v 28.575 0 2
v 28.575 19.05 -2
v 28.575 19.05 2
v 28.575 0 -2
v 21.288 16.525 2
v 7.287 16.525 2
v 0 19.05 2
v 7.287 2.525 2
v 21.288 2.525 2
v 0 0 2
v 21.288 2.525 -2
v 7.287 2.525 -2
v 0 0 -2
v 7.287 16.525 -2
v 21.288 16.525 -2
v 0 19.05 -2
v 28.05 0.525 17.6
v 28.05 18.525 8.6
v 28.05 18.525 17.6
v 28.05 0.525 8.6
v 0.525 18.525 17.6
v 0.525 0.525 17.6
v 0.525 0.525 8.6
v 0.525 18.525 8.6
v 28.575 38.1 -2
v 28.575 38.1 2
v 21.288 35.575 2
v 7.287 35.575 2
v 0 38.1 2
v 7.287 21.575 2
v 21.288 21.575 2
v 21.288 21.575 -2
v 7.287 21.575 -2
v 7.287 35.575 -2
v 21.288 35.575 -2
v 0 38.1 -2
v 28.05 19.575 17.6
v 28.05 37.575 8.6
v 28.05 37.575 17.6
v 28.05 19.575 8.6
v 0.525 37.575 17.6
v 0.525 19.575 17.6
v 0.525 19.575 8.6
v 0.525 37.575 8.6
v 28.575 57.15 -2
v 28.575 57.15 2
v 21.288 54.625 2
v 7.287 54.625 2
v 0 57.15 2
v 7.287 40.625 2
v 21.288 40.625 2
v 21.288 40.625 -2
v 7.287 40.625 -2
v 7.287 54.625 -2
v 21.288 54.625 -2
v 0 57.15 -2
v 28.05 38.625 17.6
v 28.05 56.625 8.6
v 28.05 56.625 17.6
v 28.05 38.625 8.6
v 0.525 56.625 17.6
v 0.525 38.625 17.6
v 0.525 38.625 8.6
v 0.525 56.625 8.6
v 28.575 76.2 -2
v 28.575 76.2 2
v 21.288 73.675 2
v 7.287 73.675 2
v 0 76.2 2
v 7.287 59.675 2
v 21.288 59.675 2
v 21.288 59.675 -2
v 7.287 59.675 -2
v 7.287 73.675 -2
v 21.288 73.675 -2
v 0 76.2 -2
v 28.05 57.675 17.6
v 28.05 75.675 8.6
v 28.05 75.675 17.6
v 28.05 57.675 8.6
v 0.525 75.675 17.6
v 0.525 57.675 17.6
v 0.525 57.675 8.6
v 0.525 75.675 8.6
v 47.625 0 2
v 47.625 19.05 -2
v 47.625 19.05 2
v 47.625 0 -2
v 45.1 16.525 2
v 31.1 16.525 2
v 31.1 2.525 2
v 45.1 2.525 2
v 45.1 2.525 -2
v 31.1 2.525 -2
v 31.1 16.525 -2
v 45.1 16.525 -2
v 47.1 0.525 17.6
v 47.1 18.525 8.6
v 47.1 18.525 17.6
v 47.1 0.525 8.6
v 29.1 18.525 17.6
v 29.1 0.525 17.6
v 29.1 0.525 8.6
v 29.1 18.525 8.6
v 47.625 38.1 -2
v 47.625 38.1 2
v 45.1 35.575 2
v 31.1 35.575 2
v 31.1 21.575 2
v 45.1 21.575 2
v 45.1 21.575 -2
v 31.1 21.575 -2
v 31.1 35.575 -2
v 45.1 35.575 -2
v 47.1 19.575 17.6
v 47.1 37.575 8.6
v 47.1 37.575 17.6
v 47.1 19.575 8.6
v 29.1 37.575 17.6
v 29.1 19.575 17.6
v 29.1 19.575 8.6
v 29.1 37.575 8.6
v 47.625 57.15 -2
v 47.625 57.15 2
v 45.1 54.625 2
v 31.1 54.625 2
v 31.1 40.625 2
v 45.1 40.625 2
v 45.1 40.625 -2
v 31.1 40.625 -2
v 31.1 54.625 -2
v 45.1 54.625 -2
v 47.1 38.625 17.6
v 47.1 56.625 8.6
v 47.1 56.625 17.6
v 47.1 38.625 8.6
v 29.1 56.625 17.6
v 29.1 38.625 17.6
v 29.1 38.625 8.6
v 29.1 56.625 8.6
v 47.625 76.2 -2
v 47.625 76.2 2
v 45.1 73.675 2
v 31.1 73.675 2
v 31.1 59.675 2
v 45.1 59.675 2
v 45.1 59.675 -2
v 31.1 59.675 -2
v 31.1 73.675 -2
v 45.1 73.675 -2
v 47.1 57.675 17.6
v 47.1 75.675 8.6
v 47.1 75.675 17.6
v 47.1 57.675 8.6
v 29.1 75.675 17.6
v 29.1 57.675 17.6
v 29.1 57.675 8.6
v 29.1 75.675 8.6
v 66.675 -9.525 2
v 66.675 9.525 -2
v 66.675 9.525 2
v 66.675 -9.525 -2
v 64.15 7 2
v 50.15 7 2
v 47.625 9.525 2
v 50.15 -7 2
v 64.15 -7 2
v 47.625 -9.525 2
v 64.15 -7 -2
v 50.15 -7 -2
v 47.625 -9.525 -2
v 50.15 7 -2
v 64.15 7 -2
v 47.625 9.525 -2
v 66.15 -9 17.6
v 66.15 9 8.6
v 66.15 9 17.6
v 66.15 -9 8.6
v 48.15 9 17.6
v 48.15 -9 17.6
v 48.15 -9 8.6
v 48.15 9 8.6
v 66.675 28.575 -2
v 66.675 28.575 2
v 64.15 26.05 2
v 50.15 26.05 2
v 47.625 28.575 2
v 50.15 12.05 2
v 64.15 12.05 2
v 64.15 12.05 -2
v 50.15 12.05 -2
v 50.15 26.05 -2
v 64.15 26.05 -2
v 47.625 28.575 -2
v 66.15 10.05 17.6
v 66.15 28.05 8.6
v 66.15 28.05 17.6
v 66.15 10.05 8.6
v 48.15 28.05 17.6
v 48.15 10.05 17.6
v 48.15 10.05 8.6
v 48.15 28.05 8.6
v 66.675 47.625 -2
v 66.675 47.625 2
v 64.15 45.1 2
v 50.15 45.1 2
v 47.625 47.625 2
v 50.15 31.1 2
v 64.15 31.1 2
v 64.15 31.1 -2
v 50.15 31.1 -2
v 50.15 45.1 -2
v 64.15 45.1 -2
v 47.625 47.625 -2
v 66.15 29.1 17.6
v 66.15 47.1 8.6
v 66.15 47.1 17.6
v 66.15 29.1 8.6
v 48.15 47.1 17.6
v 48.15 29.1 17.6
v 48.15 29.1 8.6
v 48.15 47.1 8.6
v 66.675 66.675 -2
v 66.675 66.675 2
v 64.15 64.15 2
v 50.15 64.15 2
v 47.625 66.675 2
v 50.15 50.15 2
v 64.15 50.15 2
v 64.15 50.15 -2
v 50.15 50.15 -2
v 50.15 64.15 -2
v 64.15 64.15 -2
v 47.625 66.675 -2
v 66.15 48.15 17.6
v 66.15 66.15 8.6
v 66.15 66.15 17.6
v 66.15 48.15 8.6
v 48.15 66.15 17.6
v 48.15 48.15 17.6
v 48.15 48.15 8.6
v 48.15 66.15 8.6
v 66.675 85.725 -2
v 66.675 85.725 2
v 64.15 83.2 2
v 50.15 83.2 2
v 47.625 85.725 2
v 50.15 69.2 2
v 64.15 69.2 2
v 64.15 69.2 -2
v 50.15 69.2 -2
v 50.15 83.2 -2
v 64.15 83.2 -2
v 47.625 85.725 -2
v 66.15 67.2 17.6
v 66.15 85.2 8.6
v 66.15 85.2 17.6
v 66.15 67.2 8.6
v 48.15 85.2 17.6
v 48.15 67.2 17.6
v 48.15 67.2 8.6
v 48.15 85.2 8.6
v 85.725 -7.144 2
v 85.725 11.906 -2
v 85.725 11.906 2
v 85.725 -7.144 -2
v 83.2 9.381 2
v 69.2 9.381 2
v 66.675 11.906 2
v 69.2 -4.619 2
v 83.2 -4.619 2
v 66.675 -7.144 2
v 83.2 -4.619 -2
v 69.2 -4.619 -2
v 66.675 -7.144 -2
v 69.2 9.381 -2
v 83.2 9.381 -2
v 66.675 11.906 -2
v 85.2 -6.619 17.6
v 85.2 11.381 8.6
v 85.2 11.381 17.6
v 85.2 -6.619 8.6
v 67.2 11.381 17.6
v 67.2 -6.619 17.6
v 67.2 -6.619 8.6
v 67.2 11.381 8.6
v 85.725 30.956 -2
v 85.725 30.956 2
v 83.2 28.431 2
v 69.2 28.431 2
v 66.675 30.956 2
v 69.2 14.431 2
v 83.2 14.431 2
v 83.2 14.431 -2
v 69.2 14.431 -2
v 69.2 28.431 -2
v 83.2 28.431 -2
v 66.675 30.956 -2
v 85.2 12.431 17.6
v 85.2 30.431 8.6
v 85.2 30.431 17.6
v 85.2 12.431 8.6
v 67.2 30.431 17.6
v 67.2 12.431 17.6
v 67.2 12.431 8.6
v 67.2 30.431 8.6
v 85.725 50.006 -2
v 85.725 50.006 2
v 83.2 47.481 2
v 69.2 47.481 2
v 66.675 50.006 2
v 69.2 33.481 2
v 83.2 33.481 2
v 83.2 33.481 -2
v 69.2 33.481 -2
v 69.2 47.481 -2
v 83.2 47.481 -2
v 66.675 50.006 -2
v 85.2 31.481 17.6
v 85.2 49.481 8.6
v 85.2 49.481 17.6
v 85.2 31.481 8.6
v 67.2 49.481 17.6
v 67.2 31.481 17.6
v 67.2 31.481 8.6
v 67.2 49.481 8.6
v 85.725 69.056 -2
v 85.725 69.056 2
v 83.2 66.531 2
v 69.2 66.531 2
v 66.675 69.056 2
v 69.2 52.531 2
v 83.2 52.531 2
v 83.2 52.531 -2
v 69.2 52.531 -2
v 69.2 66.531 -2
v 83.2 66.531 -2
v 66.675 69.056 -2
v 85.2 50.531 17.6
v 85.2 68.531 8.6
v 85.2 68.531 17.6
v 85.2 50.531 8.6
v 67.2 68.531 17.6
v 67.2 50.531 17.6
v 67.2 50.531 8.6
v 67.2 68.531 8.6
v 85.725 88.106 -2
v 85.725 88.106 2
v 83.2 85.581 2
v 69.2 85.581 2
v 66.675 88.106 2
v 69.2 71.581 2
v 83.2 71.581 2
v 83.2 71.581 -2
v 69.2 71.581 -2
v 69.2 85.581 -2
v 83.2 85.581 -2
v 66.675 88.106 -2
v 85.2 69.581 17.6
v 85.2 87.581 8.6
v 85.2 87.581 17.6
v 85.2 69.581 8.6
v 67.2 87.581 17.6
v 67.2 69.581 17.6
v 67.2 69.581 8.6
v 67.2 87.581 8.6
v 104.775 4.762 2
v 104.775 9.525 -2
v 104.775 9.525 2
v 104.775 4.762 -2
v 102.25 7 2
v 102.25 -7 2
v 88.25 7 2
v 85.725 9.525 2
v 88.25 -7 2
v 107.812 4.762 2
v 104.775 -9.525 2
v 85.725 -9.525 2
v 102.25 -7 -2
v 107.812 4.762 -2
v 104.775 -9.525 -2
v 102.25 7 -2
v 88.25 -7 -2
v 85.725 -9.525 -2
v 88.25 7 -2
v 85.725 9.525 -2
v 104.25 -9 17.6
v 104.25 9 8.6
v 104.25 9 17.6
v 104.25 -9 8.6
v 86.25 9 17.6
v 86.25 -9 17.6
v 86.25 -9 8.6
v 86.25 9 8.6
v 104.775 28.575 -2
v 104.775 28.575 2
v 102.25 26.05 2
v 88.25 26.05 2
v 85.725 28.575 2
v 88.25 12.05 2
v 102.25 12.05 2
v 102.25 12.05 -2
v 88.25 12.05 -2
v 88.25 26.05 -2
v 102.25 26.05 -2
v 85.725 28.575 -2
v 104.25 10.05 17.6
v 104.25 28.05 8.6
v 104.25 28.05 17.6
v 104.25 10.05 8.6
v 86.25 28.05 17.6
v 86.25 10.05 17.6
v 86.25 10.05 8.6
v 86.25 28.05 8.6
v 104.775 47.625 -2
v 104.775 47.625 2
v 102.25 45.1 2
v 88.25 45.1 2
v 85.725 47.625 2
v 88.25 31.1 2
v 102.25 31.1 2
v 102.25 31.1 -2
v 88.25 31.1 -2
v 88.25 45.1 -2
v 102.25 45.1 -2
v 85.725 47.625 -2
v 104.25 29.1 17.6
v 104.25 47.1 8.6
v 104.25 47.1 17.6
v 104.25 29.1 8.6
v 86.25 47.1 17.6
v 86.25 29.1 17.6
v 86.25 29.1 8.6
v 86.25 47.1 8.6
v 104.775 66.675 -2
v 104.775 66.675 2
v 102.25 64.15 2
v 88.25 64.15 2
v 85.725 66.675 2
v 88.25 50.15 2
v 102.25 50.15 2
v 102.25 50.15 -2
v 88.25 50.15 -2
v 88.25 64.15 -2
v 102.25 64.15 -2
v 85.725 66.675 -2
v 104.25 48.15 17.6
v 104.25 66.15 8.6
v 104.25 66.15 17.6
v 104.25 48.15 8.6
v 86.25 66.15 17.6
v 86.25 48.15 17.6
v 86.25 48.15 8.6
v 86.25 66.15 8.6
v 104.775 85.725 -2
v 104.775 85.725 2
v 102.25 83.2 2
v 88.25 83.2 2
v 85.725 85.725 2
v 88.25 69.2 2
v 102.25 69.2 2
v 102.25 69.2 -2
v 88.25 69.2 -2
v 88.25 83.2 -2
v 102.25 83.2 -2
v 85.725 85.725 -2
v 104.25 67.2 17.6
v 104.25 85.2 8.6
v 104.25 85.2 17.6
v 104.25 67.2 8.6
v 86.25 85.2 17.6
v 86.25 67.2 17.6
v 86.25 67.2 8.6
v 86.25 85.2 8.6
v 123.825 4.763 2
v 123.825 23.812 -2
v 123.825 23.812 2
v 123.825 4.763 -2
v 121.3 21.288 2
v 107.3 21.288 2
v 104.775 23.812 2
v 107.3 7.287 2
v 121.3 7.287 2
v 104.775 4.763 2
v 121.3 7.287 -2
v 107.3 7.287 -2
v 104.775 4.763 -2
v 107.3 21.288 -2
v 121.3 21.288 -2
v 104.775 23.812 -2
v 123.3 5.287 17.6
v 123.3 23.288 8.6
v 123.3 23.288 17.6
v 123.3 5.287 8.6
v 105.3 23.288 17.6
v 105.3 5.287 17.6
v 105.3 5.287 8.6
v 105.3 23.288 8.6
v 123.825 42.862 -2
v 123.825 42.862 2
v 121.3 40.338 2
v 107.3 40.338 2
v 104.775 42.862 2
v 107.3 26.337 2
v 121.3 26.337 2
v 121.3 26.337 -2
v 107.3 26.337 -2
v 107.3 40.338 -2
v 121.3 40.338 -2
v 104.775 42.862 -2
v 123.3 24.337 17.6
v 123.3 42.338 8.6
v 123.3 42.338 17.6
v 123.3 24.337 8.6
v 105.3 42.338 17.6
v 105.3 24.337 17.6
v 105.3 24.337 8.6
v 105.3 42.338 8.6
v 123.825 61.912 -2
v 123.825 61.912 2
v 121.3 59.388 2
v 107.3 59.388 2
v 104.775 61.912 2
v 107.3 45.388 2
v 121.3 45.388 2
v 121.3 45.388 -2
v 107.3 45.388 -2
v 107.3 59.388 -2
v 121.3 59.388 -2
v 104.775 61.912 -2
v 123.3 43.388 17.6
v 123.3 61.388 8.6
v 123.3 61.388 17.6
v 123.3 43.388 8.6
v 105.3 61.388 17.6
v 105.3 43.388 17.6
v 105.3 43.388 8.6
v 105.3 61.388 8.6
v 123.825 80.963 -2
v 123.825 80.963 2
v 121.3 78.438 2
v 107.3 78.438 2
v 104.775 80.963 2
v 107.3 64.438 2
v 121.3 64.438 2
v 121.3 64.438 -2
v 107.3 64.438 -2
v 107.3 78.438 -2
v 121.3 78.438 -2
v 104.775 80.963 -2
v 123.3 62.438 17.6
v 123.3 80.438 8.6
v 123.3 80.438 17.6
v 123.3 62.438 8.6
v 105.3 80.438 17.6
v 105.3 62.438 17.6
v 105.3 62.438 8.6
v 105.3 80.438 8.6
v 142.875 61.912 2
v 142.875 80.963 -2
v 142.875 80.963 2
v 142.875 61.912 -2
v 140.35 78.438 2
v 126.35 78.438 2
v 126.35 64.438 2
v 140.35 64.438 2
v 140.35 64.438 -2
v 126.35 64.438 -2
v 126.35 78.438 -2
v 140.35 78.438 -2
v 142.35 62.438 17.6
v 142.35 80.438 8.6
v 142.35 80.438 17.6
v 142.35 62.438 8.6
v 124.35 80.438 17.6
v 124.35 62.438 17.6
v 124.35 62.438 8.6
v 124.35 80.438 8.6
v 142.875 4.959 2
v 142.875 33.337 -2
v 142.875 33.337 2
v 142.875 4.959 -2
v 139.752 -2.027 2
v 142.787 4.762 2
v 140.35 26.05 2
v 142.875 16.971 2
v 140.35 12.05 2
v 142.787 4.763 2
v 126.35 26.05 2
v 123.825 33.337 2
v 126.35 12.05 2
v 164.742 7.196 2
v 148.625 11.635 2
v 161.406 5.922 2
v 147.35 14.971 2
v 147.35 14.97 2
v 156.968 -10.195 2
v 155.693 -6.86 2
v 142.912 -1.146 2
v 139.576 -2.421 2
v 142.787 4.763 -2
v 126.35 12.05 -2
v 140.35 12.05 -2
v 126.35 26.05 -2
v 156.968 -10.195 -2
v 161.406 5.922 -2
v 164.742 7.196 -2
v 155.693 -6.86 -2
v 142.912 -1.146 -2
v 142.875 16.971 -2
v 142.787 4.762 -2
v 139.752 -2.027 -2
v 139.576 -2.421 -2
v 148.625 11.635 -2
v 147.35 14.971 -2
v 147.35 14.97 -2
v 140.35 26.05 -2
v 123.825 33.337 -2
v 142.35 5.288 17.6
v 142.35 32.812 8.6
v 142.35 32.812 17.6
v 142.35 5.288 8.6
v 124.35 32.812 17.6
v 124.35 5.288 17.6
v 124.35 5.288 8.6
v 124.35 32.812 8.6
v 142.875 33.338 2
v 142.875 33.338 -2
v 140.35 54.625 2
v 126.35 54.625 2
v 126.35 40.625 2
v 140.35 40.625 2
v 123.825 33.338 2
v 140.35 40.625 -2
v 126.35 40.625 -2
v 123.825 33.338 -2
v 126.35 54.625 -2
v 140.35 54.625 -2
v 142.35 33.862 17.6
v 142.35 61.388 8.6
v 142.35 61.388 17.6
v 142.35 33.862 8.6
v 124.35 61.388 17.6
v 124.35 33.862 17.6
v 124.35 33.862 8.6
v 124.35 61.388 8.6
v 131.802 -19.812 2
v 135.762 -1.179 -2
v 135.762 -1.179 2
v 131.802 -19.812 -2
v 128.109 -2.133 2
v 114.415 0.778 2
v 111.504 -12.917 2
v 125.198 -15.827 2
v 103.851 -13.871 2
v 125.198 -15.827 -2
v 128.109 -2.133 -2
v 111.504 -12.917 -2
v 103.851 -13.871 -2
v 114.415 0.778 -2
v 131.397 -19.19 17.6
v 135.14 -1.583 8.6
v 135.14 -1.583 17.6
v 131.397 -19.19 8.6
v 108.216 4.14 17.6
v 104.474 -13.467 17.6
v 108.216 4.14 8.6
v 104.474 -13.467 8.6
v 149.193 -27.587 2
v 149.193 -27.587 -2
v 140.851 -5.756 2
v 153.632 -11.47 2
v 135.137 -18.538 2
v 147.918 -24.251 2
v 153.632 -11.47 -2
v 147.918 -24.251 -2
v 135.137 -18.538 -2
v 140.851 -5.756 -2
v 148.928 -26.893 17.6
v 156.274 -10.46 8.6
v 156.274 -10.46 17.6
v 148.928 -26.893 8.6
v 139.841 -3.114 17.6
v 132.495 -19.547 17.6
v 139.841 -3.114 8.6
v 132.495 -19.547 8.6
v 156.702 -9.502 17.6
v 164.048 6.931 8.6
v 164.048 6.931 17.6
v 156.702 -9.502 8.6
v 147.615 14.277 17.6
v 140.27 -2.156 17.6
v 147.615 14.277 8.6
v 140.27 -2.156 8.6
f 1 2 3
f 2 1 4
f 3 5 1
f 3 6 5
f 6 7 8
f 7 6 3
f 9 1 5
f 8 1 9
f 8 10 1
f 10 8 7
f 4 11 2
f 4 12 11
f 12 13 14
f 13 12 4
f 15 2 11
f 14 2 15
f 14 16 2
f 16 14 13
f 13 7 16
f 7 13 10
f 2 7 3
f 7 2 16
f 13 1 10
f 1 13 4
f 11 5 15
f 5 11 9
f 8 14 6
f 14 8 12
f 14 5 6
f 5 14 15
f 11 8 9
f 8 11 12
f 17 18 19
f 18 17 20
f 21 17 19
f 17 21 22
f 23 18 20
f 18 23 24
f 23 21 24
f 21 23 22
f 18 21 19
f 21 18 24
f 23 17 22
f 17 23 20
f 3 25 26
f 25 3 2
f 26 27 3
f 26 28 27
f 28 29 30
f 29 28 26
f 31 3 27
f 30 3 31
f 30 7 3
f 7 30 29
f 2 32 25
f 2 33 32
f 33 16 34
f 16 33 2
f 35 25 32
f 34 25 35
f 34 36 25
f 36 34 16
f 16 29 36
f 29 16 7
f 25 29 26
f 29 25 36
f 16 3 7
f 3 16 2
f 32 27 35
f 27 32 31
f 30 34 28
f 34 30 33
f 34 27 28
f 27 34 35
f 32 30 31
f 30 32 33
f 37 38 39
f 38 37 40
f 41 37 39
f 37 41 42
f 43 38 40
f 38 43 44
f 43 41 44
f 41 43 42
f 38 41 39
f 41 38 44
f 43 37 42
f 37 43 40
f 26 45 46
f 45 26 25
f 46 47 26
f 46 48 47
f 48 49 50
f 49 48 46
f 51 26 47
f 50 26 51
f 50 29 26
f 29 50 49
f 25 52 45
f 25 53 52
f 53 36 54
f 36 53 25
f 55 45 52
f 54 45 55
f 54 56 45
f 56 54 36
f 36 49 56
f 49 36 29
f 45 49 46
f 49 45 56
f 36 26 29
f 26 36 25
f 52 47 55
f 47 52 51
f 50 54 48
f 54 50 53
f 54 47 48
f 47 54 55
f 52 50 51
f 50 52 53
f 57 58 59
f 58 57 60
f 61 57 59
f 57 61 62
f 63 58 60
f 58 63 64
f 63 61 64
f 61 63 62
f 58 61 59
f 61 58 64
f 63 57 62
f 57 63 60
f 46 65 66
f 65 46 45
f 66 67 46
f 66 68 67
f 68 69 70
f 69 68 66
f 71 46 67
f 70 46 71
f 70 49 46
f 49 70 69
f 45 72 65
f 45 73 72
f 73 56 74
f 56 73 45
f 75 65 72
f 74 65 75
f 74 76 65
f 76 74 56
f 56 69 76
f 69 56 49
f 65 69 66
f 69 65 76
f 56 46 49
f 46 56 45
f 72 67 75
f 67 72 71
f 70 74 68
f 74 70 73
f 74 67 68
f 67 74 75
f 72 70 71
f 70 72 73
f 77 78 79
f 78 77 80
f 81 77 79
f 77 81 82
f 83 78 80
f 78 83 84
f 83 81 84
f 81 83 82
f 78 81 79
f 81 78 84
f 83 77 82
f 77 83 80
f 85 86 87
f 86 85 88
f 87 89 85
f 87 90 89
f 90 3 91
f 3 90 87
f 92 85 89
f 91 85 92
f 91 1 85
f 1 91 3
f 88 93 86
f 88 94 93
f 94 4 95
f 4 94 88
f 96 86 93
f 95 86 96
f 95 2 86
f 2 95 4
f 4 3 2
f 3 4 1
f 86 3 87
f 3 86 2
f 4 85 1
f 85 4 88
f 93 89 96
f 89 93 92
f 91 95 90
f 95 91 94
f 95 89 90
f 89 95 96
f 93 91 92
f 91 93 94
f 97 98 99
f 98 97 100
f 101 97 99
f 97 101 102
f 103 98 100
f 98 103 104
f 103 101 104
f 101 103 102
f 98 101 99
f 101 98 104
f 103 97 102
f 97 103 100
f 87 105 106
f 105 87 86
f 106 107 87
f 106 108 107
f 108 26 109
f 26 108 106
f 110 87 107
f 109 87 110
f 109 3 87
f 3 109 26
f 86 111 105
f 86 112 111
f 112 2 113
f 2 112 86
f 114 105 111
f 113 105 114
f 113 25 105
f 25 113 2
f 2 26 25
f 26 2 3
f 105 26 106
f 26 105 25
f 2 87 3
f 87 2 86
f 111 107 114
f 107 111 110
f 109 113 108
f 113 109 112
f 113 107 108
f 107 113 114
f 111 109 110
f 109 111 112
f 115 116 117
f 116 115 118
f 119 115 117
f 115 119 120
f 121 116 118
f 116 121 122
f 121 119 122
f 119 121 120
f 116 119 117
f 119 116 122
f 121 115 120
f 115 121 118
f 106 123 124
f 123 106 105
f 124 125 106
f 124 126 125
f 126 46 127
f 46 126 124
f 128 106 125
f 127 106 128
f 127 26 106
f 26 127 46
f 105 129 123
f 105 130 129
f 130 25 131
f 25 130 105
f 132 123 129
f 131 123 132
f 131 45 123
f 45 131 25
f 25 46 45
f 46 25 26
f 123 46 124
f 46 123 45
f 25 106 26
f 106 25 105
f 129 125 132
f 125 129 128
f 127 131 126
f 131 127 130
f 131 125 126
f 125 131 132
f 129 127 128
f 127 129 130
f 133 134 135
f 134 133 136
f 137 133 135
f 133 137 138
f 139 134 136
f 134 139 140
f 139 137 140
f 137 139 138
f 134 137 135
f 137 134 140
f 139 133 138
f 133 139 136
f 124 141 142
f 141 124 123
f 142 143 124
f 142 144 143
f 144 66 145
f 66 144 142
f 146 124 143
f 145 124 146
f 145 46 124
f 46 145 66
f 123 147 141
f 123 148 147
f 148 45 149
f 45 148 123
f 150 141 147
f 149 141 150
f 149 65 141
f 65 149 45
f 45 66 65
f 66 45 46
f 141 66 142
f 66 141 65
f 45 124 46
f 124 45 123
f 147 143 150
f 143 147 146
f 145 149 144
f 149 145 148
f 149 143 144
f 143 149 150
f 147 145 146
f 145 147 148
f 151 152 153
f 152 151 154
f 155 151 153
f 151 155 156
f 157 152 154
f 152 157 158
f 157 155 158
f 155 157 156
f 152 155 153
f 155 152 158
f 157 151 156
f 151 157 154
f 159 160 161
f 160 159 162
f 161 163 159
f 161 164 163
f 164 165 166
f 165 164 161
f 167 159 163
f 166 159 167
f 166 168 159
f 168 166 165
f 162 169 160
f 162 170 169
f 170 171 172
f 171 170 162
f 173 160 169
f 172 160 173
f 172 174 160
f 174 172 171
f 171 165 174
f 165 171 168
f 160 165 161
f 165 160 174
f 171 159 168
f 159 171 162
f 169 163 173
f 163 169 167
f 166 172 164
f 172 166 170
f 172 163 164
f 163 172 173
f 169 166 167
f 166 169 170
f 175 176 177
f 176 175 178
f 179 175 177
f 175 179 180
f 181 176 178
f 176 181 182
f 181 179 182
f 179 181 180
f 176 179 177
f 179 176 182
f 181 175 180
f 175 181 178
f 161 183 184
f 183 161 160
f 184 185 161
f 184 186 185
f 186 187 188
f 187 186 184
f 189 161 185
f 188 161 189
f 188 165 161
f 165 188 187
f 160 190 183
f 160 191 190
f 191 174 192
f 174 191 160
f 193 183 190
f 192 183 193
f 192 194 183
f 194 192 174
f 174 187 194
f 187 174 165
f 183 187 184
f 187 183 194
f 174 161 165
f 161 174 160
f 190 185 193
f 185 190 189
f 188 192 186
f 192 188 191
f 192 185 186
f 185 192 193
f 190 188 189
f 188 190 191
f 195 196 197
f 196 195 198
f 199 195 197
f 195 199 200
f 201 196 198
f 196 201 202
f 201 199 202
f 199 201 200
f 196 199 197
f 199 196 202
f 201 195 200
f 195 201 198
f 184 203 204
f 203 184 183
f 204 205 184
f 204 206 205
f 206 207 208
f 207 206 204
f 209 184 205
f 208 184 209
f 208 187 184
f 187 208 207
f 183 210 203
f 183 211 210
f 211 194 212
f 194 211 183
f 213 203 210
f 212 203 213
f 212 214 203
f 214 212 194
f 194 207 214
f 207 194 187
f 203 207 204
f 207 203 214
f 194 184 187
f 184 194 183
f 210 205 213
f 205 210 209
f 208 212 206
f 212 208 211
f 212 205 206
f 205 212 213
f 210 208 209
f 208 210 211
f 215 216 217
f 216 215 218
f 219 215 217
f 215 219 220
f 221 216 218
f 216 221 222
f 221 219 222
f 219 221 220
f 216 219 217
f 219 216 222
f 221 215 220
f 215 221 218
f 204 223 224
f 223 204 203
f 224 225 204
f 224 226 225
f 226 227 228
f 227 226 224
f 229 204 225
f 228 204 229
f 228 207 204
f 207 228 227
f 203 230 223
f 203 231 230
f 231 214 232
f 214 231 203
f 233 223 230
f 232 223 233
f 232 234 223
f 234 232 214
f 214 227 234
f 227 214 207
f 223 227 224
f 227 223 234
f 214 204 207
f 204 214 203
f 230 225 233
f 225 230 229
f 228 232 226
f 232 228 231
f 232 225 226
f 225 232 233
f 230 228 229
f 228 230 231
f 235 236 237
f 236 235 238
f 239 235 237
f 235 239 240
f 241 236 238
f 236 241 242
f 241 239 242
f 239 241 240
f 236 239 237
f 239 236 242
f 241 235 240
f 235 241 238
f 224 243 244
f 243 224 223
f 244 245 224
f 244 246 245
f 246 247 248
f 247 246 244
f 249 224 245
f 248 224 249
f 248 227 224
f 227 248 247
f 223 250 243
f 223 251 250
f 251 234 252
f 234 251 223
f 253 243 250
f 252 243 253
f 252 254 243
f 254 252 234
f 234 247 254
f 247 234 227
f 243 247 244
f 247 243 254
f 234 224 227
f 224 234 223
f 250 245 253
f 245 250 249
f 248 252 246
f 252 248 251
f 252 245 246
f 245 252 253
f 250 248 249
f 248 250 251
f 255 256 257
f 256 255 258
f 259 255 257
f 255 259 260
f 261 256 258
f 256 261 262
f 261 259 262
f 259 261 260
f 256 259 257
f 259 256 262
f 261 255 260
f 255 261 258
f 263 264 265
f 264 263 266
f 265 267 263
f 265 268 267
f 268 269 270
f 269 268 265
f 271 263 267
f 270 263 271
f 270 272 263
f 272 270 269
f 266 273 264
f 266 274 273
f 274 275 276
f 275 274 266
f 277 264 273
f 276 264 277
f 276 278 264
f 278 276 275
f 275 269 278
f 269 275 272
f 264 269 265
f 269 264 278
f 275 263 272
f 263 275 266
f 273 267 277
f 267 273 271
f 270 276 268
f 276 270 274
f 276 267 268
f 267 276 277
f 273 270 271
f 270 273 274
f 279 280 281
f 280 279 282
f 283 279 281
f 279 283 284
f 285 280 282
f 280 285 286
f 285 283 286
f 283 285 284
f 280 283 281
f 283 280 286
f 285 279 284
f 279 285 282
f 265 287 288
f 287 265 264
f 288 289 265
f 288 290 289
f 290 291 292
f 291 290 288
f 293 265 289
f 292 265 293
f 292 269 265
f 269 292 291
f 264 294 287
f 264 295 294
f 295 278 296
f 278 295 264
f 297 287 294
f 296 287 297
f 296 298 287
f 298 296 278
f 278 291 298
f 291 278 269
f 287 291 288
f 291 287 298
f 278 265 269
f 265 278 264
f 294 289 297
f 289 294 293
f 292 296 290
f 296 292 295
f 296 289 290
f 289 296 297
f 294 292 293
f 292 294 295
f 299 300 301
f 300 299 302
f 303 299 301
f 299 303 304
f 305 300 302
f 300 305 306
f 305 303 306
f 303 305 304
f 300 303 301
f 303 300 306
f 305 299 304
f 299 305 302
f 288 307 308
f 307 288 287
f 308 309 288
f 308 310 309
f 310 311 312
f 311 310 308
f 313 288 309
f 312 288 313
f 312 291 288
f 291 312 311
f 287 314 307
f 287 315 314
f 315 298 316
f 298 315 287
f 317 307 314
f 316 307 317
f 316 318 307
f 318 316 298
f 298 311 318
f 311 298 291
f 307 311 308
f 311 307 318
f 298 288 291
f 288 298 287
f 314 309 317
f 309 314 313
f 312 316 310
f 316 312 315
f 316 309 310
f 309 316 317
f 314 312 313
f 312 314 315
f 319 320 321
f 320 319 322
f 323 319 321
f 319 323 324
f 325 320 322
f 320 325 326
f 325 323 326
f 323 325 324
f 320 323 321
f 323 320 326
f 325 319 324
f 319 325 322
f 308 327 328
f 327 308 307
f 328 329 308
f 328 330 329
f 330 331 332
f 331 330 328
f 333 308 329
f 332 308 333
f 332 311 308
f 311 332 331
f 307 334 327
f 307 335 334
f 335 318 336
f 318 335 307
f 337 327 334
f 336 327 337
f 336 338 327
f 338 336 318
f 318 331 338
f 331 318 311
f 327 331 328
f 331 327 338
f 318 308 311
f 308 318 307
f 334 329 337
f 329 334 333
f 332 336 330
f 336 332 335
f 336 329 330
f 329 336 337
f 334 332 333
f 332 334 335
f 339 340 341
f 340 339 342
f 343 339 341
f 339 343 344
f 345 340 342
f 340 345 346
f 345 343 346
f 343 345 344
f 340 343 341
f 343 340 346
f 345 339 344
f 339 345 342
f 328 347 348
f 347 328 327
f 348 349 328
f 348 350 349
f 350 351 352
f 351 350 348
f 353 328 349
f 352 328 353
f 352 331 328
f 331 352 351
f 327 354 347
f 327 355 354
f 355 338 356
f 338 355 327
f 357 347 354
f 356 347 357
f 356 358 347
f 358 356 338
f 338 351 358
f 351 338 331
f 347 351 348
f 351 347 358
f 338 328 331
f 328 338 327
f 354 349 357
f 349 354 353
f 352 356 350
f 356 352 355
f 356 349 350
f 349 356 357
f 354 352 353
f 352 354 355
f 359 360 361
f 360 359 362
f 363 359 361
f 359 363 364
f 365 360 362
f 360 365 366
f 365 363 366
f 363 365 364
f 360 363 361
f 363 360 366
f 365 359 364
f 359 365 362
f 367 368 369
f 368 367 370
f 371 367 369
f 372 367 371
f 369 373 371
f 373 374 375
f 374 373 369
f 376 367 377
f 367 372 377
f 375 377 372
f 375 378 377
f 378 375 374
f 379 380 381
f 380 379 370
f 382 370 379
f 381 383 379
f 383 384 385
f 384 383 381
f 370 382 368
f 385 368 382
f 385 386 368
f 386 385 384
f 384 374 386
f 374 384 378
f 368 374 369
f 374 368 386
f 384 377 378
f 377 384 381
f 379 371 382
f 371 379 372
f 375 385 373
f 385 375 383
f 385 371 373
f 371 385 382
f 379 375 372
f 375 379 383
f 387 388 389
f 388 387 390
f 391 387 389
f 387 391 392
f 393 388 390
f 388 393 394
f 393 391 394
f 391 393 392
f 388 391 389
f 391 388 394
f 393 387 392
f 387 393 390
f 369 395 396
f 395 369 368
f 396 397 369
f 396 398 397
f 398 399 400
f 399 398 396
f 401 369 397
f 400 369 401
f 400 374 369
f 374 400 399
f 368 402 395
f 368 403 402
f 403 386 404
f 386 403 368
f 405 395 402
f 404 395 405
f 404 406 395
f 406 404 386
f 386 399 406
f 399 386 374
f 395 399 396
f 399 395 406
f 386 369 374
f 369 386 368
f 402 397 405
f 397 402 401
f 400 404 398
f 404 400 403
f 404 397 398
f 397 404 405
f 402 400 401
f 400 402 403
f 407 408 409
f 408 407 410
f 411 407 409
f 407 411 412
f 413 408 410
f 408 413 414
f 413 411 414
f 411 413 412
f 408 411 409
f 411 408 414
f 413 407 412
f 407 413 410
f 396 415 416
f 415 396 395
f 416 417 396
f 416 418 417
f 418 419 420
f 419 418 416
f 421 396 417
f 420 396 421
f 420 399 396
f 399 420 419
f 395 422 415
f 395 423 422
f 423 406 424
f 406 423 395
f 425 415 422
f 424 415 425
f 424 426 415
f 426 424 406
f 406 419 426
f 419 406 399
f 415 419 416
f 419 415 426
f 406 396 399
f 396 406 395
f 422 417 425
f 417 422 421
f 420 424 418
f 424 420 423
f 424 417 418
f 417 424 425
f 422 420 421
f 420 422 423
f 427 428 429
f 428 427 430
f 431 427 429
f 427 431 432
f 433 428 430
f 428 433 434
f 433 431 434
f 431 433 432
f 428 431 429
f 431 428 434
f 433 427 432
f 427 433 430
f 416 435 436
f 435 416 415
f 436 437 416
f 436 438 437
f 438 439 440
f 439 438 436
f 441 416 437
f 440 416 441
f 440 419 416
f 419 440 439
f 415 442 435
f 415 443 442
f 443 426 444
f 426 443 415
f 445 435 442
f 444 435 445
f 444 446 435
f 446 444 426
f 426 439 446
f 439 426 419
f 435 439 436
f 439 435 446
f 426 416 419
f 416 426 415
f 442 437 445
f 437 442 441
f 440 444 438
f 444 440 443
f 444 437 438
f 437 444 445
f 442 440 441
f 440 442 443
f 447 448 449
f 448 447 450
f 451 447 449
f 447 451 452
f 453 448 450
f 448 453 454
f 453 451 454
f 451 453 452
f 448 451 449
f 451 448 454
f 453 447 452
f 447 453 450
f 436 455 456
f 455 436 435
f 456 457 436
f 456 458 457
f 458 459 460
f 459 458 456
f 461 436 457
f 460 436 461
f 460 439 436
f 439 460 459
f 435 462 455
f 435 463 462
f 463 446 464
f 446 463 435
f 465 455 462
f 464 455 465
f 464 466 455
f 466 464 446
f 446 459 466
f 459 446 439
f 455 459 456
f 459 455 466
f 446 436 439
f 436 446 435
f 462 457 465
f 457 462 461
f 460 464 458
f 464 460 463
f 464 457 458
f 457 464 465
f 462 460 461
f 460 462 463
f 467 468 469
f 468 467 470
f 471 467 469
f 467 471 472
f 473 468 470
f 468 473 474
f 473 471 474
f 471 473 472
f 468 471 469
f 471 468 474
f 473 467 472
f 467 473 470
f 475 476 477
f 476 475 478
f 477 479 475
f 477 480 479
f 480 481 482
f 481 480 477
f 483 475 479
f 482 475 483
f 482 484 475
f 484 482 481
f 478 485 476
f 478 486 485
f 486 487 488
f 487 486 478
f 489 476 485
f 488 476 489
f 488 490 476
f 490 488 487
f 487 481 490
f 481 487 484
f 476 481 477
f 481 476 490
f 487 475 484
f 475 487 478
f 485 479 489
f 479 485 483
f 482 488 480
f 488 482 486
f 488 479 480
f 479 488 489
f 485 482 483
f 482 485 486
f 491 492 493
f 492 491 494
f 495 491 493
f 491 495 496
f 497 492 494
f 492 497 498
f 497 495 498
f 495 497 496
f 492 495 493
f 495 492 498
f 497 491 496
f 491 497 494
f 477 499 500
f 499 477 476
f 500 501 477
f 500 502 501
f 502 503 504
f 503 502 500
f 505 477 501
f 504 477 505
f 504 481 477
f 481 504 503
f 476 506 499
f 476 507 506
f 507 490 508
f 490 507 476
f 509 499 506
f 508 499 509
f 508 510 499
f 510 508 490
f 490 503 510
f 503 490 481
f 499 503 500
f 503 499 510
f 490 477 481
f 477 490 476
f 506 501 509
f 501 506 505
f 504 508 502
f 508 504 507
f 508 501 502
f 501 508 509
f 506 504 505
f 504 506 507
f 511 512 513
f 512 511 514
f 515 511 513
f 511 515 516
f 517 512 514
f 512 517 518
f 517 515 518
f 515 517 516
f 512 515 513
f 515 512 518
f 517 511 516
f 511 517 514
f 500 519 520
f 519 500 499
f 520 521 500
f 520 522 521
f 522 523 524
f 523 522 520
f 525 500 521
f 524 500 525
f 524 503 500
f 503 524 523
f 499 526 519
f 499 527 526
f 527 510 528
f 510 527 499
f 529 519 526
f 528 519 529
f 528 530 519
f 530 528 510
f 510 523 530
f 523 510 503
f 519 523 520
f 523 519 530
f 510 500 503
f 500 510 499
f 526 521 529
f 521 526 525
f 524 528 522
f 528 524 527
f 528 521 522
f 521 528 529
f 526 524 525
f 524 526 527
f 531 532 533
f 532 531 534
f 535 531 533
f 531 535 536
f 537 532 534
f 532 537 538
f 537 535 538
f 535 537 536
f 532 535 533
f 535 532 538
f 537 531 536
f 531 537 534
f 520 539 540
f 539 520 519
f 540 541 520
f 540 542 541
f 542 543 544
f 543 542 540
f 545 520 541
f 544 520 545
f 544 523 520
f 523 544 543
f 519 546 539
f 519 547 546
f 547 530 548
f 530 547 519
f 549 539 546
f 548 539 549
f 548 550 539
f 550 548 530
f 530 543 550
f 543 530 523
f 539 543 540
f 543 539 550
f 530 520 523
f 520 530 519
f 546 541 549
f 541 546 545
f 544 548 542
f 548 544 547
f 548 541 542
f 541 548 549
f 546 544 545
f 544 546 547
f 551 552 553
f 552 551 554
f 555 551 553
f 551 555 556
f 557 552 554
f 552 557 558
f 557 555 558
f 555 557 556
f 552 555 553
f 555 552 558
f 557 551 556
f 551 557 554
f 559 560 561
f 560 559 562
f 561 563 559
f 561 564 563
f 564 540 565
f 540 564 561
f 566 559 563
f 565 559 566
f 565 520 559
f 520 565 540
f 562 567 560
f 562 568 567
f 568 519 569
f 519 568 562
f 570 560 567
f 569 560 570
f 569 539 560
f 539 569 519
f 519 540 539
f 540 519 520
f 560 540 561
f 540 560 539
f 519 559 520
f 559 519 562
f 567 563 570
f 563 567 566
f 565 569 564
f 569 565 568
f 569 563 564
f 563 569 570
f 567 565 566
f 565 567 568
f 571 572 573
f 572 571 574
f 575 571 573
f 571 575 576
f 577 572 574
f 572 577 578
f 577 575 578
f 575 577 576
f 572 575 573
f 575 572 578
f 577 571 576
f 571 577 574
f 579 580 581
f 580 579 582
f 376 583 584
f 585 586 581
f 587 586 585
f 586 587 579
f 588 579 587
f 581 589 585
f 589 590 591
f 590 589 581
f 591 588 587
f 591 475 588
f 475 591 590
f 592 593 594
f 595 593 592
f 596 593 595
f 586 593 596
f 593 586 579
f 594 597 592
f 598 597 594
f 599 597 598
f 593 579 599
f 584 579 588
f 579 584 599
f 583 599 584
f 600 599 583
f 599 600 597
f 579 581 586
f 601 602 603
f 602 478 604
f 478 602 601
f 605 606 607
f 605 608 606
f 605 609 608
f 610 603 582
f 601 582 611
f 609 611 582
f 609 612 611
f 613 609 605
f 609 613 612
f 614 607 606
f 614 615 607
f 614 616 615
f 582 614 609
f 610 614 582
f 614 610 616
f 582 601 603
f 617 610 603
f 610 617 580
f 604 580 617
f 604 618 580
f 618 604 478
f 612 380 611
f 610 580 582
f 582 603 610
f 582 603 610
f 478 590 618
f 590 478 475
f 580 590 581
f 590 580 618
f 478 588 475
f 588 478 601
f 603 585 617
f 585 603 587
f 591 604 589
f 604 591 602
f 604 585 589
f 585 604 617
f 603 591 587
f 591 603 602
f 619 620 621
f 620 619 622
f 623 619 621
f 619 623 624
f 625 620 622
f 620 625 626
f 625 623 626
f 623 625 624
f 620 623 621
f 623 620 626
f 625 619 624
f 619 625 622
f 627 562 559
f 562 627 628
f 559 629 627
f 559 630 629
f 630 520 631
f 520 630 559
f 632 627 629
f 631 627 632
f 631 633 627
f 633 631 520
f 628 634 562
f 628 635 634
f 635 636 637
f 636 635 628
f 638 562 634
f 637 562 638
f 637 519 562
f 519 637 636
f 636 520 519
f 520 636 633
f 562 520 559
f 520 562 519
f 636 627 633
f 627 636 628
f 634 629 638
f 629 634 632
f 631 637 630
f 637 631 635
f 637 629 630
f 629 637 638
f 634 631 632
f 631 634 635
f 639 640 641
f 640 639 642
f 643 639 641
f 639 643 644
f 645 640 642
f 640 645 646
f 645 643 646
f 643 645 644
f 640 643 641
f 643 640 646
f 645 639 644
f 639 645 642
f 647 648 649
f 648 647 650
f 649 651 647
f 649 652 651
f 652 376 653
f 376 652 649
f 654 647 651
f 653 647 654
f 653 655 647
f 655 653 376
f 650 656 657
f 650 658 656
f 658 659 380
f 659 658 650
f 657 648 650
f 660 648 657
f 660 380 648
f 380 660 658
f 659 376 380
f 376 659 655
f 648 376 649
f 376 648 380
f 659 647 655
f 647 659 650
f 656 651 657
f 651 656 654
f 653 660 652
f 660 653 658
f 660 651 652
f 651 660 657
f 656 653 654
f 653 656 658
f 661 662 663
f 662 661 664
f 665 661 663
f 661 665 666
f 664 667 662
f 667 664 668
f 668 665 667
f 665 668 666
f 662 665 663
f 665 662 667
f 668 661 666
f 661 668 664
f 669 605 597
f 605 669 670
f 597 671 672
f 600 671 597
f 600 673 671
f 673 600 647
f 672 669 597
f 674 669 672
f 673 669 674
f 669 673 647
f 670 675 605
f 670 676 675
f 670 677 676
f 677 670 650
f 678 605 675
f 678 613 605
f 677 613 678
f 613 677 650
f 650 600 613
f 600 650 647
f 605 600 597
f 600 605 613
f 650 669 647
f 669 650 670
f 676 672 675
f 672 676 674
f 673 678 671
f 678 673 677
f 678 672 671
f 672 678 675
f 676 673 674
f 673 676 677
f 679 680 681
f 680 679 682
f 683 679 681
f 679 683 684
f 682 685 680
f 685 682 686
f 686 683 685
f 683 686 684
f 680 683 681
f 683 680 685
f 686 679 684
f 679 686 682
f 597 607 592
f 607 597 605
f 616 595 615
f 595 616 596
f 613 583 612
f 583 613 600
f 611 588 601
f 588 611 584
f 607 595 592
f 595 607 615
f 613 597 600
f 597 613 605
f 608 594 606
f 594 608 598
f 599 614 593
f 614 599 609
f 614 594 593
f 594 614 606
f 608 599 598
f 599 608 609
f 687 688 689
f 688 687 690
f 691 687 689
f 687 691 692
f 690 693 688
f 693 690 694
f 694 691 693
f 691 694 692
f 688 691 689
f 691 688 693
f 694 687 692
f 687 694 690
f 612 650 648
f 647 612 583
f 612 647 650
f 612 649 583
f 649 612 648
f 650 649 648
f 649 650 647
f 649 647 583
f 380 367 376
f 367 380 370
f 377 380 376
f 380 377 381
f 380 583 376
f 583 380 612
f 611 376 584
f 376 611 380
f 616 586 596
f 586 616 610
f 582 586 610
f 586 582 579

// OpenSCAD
// Generated by SolidPython 1.1.1 on 2021-04-11 10:07:29


union() {
	cube(size = 0);
	translate(v = [14.2875000000, 0, 0]) {
		translate(v = [0, 0.0000000000, 0]) {
			union() {
				cube(size = 0);
				translate(v = [0, 9.5250000000, 0]) {
					union() {
						difference() {
							cube(center = true, size = [28.5750000000, 19.0500000000, 4]);
							cube(center = true, size = [14, 14, 4.2000000000]);
						}
						translate(v = [0, 0, 13.1000000000]) {
							color(alpha = 1.0000000000, c = [0.0000000000, 1.0000000000, 0.5000000000]) {
								cube(center = true, size = [27.5250000000, 18.0000000000, 9]);
							}
						}
					}
				}
				translate(v = [0, 28.5750000000, 0]) {
					union() {
						difference() {
							cube(center = true, size = [28.5750000000, 19.0500000000, 4]);
							cube(center = true, size = [14, 14, 4.2000000000]);
						}
						translate(v = [0, 0, 13.1000000000]) {
							color(alpha = 1.0000000000, c = [0.0000000000, 1.0000000000, 0.5000000000]) {
								cube(center = true, size = [27.5250000000, 18.0000000000, 9]);
							}
						}
					}
				}
				translate(v = [0, 47.6250000000, 0]) {
					union() {
						difference() {
							cube(center = true, size = [28.5750000000, 19.0500000000, 4]);
							cube(center = true, size = [14, 14, 4.2000000000]);
						}
						translate(v = [0, 0, 13.1000000000]) {
							color(alpha = 1.0000000000, c = [0.0000000000, 1.0000000000, 0.5000000000]) {
								cube(center = true, size = [27.5250000000, 18.0000000000, 9]);
							}
						}
					}
				}
				translate(v = [0, 66.6750000000, 0]) {
					union() {
						difference() {
							cube(center = true, size = [28.5750000000, 19.0500000000, 4]);
							cube(center = true, size = [14, 14, 4.2000000000]);
						}
						translate(v = [0, 0, 13.1000000000]) {
							color(alpha = 1.0000000000, c = [0.0000000000, 1.0000000000, 0.5000000000]) {
								cube(center = true, size = [27.5250000000, 18.0000000000, 9]);
							}
						}
					}
				}
			}
		}
	}
	translate(v = [38.1000000000, 0, 0]) {
		translate(v = [0, 0.0000000000, 0]) {
			union() {
				cube(size = 0);
				translate(v = [0, 9.5250000000, 0]) {
					union() {
						difference() {
							cube(center = true, size = [19.0500000000, 19.0500000000, 4]);
							cube(center = true, size = [14, 14, 4.2000000000]);
						}
						translate(v = [0, 0, 13.1000000000]) {
							color(alpha = 1.0000000000, c = [0.0000000000, 1.0000000000, 0.5000000000]) {
								cube(center = true, size = [18.0000000000, 18.0000000000, 9]);
							}
						}
					}
				}
				translate(v = [0, 28.5750000000, 0]) {
					union() {
						difference() {
							cube(center = true, size = [19.0500000000, 19.0500000000, 4]);
							cube(center = true, size = [14, 14, 4.2000000000]);
						}
						translate(v = [0, 0, 13.1000000000]) {
							color(alpha = 1.0000000000, c = [0.0000000000, 1.0000000000, 0.5000000000]) {
								cube(center = true, size = [18.0000000000, 18.0000000000, 9]);
							}
						}
					}
				}
				translate(v = [0, 47.6250000000, 0]) {
					union() {
						difference() {
							cube(center = true, size = [19.0500000000, 19.0500000000, 4]);
							cube(center = true, size = [14, 14, 4.2000000000]);
						}
						translate(v = [0, 0, 13.1000000000]) {
							color(alpha = 1.0000000000, c = [0.0000000000, 1.0000000000, 0.5000000000]) {
								cube(center = true, size = [18.0000000000, 18.0000000000, 9]);
							}
						}
					}
				}
				translate(v = [0, 66.6750000000, 0]) {
					union() {
						difference() {
							cube(center = true, size = [19.0500000000, 19.0500000000, 4]);
							cube(center = true, size = [14, 14, 4.2000000000]);
						}
						translate(v = [0, 0, 13.1000000000]) {
							color(alpha = 1.0000000000, c = [0.0000000000, 1.0000000000, 0.5000000000]) {
								cube(center = true, size = [18.0000000000, 18.0000000000, 9]);
							}
						}
					}
				}
			}
		}
	}
	translate(v = [57.1500000000, 0, 0]) {
		translate(v = [0, -9.5250000000, 0]) {
			union() {
				cube(size = 0);
				translate(v = [0, 9.5250000000, 0]) {
					union() {
						difference() {
							cube(center = true, size = [19.0500000000, 19.0500000000, 4]);
							cube(center = true, size = [14, 14, 4.2000000000]);
						}
						translate(v = [0, 0, 13.1000000000]) {
							color(alpha = 1.0000000000, c = [0.0000000000, 1.0000000000, 0.5000000000]) {
								cube(center = true, size = [18.0000000000, 18.0000000000, 9]);
							}
						}
					}
				}
				translate(v = [0, 28.5750000000, 0]) {
					union() {
						difference() {
							cube(center = true, size = [19.0500000000, 19.0500000000, 4]);
							cube(center = true, size = [14, 14, 4.2000000000]);
						}
						translate(v = [0, 0, 13.1000000000]) {
							color(alpha = 1.0000000000, c = [0.0000000000, 1.0000000000, 0.5000000000]) {
								cube(center = true, size = [18.0000000000, 18.0000000000, 9]);
							}
						}
					}
				}
				translate(v = [0, 47.6250000000, 0]) {
					union() {
						difference() {
							cube(center = true, size = [19.0500000000, 19.0500000000, 4]);
							cube(center = true, size = [14, 14, 4.2000000000]);
						}
						translate(v = [0, 0, 13.1000000000]) {
							color(alpha = 1.0000000000, c = [0.0000000000, 1.0000000000, 0.5000000000]) {
								cube(center = true, size = [18.0000000000, 18.0000000000, 9]);
							}
						}
					}
				}
				translate(v = [0, 66.6750000000, 0]) {
					union() {
						difference() {
							cube(center = true, size = [19.0500000000, 19.0500000000, 4]);
							cube(center = true, size = [14, 14, 4.2000000000]);
						}
						translate(v = [0, 0, 13.1000000000]) {
							color(alpha = 1.0000000000, c = [0.0000000000, 1.0000000000, 0.5000000000]) {
								cube(center = true, size = [18.0000000000, 18.0000000000, 9]);
							}
						}
					}
				}
				translate(v = [0, 85.7250000000, 0]) {
					union() {
						difference() {
							cube(center = true, size = [19.0500000000, 19.0500000000, 4]);
							cube(center = true, size = [14, 14, 4.2000000000]);
						}
						translate(v = [0, 0, 13.1000000000]) {
							color(alpha = 1.0000000000, c = [0.0000000000, 1.0000000000, 0.5000000000]) {
								cube(center = true, size = [18.0000000000, 18.0000000000, 9]);
							}
						}
					}
				}
			}
		}
	}
	translate(v = [76.2000000000, 0, 0]) {
		translate(v = [0, -7.1437500000, 0]) {
			union() {
				cube(size = 0);
				translate(v = [0, 9.5250000000, 0]) {
					union() {
						difference() {
							cube(center = true, size = [19.0500000000, 19.0500000000, 4]);
							cube(center = true, size = [14, 14, 4.2000000000]);
						}
						translate(v = [0, 0, 13.1000000000]) {
							color(alpha = 1.0000000000, c = [0.0000000000, 1.0000000000, 0.5000000000]) {
								cube(center = true, size = [18.0000000000, 18.0000000000, 9]);
							}
						}
					}
				}
				translate(v = [0, 28.5750000000, 0]) {
					union() {
						difference() {
							cube(center = true, size = [19.0500000000, 19.0500000000, 4]);
							cube(center = true, size = [14, 14, 4.2000000000]);
						}
						translate(v = [0, 0, 13.1000000000]) {
							color(alpha = 1.0000000000, c = [0.0000000000, 1.0000000000, 0.5000000000]) {
								cube(center = true, size = [18.0000000000, 18.0000000000, 9]);
							}
						}
					}
				}
				translate(v = [0, 47.6250000000, 0]) {
					union() {
						difference() {
							cube(center = true, size = [19.0500000000, 19.0500000000, 4]);
							cube(center = true, size = [14, 14, 4.2000000000]);
						}
						translate(v = [0, 0, 13.1000000000]) {
							color(alpha = 1.0000000000, c = [0.0000000000, 1.0000000000, 0.5000000000]) {
								cube(center = true, size = [18.0000000000, 18.0000000000, 9]);
							}
						}
					}
				}
				translate(v = [0, 66.6750000000, 0]) {
					union() {
						difference() {
							cube(center = true, size = [19.0500000000, 19.0500000000, 4]);
							cube(center = true, size = [14, 14, 4.2000000000]);
						}
						translate(v = [0, 0, 13.1000000000]) {
							color(alpha = 1.0000000000, c = [0.0000000000, 1.0000000000, 0.5000000000]) {
								cube(center = true, size = [18.0000000000, 18.0000000000, 9]);
							}
						}
					}
				}
				translate(v = [0, 85.7250000000, 0]) {
					union() {
						difference() {
							cube(center = true, size = [19.0500000000, 19.0500000000, 4]);
							cube(center = true, size = [14, 14, 4.2000000000]);
						}
						translate(v = [0, 0, 13.1000000000]) {
							color(alpha = 1.0000000000, c = [0.0000000000, 1.0000000000, 0.5000000000]) {
								cube(center = true, size = [18.0000000000, 18.0000000000, 9]);
							}
						}
					}
				}
			}
		}
	}
	translate(v = [95.2500000000, 0, 0]) {
		translate(v = [0, -9.5250000000, 0]) {
			union() {
				cube(size = 0);
				translate(v = [0, 9.5250000000, 0]) {
					union() {
						difference() {
							cube(center = true, size = [19.0500000000, 19.0500000000, 4]);
							cube(center = true, size = [14, 14, 4.2000000000]);
						}
						translate(v = [0, 0, 13.1000000000]) {
							color(alpha = 1.0000000000, c = [0.0000000000, 1.0000000000, 0.5000000000]) {
								cube(center = true, size = [18.0000000000, 18.0000000000, 9]);
							}
						}
					}
				}
				translate(v = [0, 28.5750000000, 0]) {
					union() {
						difference() {
							cube(center = true, size = [19.0500000000, 19.0500000000, 4]);
							cube(center = true, size = [14, 14, 4.2000000000]);
						}
						translate(v = [0, 0, 13.1000000000]) {
							color(alpha = 1.0000000000, c = [0.0000000000, 1.0000000000, 0.5000000000]) {
								cube(center = true, size = [18.0000000000, 18.0000000000, 9]);
							}
						}
					}
				}
				translate(v = [0, 47.6250000000, 0]) {
					union() {
						difference() {
							cube(center = true, size = [19.0500000000, 19.0500000000, 4]);
							cube(center = true, size = [14, 14, 4.2000000000]);
						}
						translate(v = [0, 0, 13.1000000000]) {
							color(alpha = 1.0000000000, c = [0.0000000000, 1.0000000000, 0.5000000000]) {
								cube(center = true, size = [18.0000000000, 18.0000000000, 9]);
							}
						}
					}
				}
				translate(v = [0, 66.6750000000, 0]) {
					union() {
						difference() {
							cube(center = true, size = [19.0500000000, 19.0500000000, 4]);
							cube(center = true, size = [14, 14, 4.2000000000]);
						}
						translate(v = [0, 0, 13.1000000000]) {
							color(alpha = 1.0000000000, c = [0.0000000000, 1.0000000000, 0.5000000000]) {
								cube(center = true, size = [18.0000000000, 18.0000000000, 9]);
							}
						}
					}
				}
				translate(v = [0, 85.7250000000, 0]) {
					union() {
						difference() {
							cube(center = true, size = [19.0500000000, 19.0500000000, 4]);
							cube(center = true, size = [14, 14, 4.2000000000]);
						}
						translate(v = [0, 0, 13.1000000000]) {
							color(alpha = 1.0000000000, c = [0.0000000000, 1.0000000000, 0.5000000000]) {
								cube(center = true, size = [18.0000000000, 18.0000000000, 9]);
							}
						}
					}
				}
			}
		}
	}
	translate(v = [114.3000000000, 0, 0]) {
		translate(v = [0, 4.7625000000, 0]) {
			union() {
				cube(size = 0);
				translate(v = [0, 9.5250000000, 0]) {
					union() {
						difference() {
							cube(center = true, size = [19.0500000000, 19.0500000000, 4]);
							cube(center = true, size = [14, 14, 4.2000000000]);
						}
						translate(v = [0, 0, 13.1000000000]) {
							color(alpha = 1.0000000000, c = [0.0000000000, 1.0000000000, 0.5000000000]) {
								cube(center = true, size = [18.0000000000, 18.0000000000, 9]);
							}
						}
					}
				}
				translate(v = [0, 28.5750000000, 0]) {
					union() {
						difference() {
							cube(center = true, size = [19.0500000000, 19.0500000000, 4]);
							cube(center = true, size = [14, 14, 4.2000000000]);
						}
						translate(v = [0, 0, 13.1000000000]) {
							color(alpha = 1.0000000000, c = [0.0000000000, 1.0000000000, 0.5000000000]) {
								cube(center = true, size = [18.0000000000, 18.0000000000, 9]);
							}
						}
					}
				}
				translate(v = [0, 47.6250000000, 0]) {
					union() {
						difference() {
							cube(center = true, size = [19.0500000000, 19.0500000000, 4]);
							cube(center = true, size = [14, 14, 4.2000000000]);
						}
						translate(v = [0, 0, 13.1000000000]) {
							color(alpha = 1.0000000000, c = [0.0000000000, 1.0000000000, 0.5000000000]) {
								cube(center = true, size = [18.0000000000, 18.0000000000, 9]);
							}
						}
					}
				}
				translate(v = [0, 66.6750000000, 0]) {
					union() {
						difference() {
							cube(center = true, size = [19.0500000000, 19.0500000000, 4]);
							cube(center = true, size = [14, 14, 4.2000000000]);
						}
						translate(v = [0, 0, 13.1000000000]) {
							color(alpha = 1.0000000000, c = [0.0000000000, 1.0000000000, 0.5000000000]) {
								cube(center = true, size = [18.0000000000, 18.0000000000, 9]);
							}
						}
					}
				}
			}
		}
	}
	translate(v = [133.3500000000, 0, 0]) {
		translate(v = [0, 4.7625000000, 0]) {
			union() {
				cube(size = 0);
				translate(v = [0, 14.2875000000, 0]) {
					union() {
						difference() {
							cube(center = true, size = [19.0500000000, 28.5750000000, 4]);
							cube(center = true, size = [14, 14, 4.2000000000]);
						}
						translate(v = [0, 0, 13.1000000000]) {
							color(alpha = 1.0000000000, c = [0.0000000000, 1.0000000000, 0.5000000000]) {
								cube(center = true, size = [18.0000000000, 27.5250000000, 9]);
							}
						}
					}
				}
				translate(v = [0, 42.8625000000, 0]) {
					union() {
						difference() {
							cube(center = true, size = [19.0500000000, 28.5750000000, 4]);
							cube(center = true, size = [14, 14, 4.2000000000]);
						}
						translate(v = [0, 0, 13.1000000000]) {
							color(alpha = 1.0000000000, c = [0.0000000000, 1.0000000000, 0.5000000000]) {
								cube(center = true, size = [18.0000000000, 27.5250000000, 9]);
							}
						}
					}
				}
				translate(v = [0, 66.6750000000, 0]) {
					union() {
						difference() {
							cube(center = true, size = [19.0500000000, 19.0500000000, 4]);
							cube(center = true, size = [14, 14, 4.2000000000]);
						}
						translate(v = [0, 0, 13.1000000000]) {
							color(alpha = 1.0000000000, c = [0.0000000000, 1.0000000000, 0.5000000000]) {
								cube(center = true, size = [18.0000000000, 18.0000000000, 9]);
							}
						}
					}
				}
			}
		}
	}
	translate(v = [104.7750000000, 0, 0]) {
		translate(v = [0, 4.7625000000, 0]) {
			polyhedron(convexity = 5, faces = [[0, 2, 1], [0, 1, 4, 3], [1, 2, 5, 4], [2, 0, 3, 5], [3, 4, 5]], points = [[0, 0, -2.0000000000], [3.0369018749, 0, -2.0000000000], [0, -14.2875000000, -2.0000000000], [0, 0, 2.0000000000], [3.0369018749, 0, 2.0000000000], [0, -14.2875000000, 2.0000000000]]);
		}
	}
	translate(v = [107.8119018749, 0, 0]) {
		translate(v = [0, 4.7625000000, 0]) {
			rotate(a = 12.0000000000, v = [0, 0, -1]) {
				union() {
					translate(v = [28.5750000000, 0, 0]) {
						translate(v = [-14.2875000000, 0, 0]) {
							translate(v = [0, -9.5250000000, 0]) {
								union() {
									difference() {
										cube(center = true, size = [28.5750000000, 19.0500000000, 4]);
										cube(center = true, size = [14, 14, 4.2000000000]);
									}
									translate(v = [0, 0, 13.1000000000]) {
										color(alpha = 1.0000000000, c = [0.0000000000, 1.0000000000, 0.5000000000]) {
											cube(center = true, size = [27.5250000000, 18.0000000000, 9]);
										}
									}
								}
							}
						}
					}
					translate(v = [0, -19.0500000000, 0]) {
						translate(v = [28.5750000000, 0, 0]) {
							polyhedron(convexity = 5, faces = [[0, 2, 1], [0, 1, 4, 3], [1, 2, 5, 4], [2, 0, 3, 5], [3, 4, 5]], points = [[0, 0, -2.0000000000], [4.0789901917, 19.0500000000, -2.0000000000], [0, 19.0500000000, -2.0000000000], [0, 0, 2.0000000000], [4.0789901917, 19.0500000000, 2.0000000000], [0, 19.0500000000, 2.0000000000]]);
						}
					}
					translate(v = [0, -19.0500000000, 0]) {
						translate(v = [28.5750000000, 0, 0]) {
							rotate(a = 12.0856909360, v = [0, 0, -1]) {
								translate(v = [9.5250000000, 0, 0]) {
									union() {
										cube(size = 0);
										translate(v = [0, 9.5250000000, 0]) {
											union() {
												difference() {
													cube(center = true, size = [19.0500000000, 19.0500000000, 4]);
													cube(center = true, size = [14, 14, 4.2000000000]);
												}
												translate(v = [0, 0, 13.1000000000]) {
													color(alpha = 1.0000000000, c = [0.0000000000, 1.0000000000, 0.5000000000]) {
														cube(center = true, size = [18.0000000000, 18.0000000000, 9]);
													}
												}
											}
										}
										translate(v = [0, 28.5750000000, 0]) {
											union() {
												difference() {
													cube(center = true, size = [19.0500000000, 19.0500000000, 4]);
													cube(center = true, size = [14, 14, 4.2000000000]);
												}
												translate(v = [0, 0, 13.1000000000]) {
													color(alpha = 1.0000000000, c = [0.0000000000, 1.0000000000, 0.5000000000]) {
														cube(center = true, size = [18.0000000000, 18.0000000000, 9]);
													}
												}
											}
										}
									}
								}
							}
						}
					}
				}
			}
		}
	}
	translate(v = [104.7750000000, 0, 0]) {
		translate(v = [0, 4.7625000000, 0]) {
			polyhedron(convexity = 5, faces = [[0, 2, 1], [0, 1, 4, 3], [1, 2, 5, 4], [2, 0, 3, 5], [3, 4, 5]], points = [[3.0369018749, 0, -2.0000000000], [34.9773240353, -6.7891463127, -2.0000000000], [38.1000000000, 0, -2.0000000000], [3.0369018749, 0, 2.0000000000], [34.9773240353, -6.7891463127, 2.0000000000], [38.1000000000, 0, 2.0000000000]]);
		}
	}
	translate(v = [142.8750000000, 0, 0]) {
		translate(v = [0, 4.7625000000, 0]) {
			polyhedron(convexity = 5, faces = [[0, 2, 1], [0, 1, 4, 3], [1, 2, 5, 4], [2, 0, 3, 5], [3, 4, 5]], points = [[0, 0, -2.0000000000], [4.5484401413, 10.1749819254, -2.0000000000], [0, 12.2082344532, -2.0000000000], [0, 0, 2.0000000000], [4.5484401413, 10.1749819254, 2.0000000000], [0, 12.2082344532, 2.0000000000]]);
		}
	}
}
